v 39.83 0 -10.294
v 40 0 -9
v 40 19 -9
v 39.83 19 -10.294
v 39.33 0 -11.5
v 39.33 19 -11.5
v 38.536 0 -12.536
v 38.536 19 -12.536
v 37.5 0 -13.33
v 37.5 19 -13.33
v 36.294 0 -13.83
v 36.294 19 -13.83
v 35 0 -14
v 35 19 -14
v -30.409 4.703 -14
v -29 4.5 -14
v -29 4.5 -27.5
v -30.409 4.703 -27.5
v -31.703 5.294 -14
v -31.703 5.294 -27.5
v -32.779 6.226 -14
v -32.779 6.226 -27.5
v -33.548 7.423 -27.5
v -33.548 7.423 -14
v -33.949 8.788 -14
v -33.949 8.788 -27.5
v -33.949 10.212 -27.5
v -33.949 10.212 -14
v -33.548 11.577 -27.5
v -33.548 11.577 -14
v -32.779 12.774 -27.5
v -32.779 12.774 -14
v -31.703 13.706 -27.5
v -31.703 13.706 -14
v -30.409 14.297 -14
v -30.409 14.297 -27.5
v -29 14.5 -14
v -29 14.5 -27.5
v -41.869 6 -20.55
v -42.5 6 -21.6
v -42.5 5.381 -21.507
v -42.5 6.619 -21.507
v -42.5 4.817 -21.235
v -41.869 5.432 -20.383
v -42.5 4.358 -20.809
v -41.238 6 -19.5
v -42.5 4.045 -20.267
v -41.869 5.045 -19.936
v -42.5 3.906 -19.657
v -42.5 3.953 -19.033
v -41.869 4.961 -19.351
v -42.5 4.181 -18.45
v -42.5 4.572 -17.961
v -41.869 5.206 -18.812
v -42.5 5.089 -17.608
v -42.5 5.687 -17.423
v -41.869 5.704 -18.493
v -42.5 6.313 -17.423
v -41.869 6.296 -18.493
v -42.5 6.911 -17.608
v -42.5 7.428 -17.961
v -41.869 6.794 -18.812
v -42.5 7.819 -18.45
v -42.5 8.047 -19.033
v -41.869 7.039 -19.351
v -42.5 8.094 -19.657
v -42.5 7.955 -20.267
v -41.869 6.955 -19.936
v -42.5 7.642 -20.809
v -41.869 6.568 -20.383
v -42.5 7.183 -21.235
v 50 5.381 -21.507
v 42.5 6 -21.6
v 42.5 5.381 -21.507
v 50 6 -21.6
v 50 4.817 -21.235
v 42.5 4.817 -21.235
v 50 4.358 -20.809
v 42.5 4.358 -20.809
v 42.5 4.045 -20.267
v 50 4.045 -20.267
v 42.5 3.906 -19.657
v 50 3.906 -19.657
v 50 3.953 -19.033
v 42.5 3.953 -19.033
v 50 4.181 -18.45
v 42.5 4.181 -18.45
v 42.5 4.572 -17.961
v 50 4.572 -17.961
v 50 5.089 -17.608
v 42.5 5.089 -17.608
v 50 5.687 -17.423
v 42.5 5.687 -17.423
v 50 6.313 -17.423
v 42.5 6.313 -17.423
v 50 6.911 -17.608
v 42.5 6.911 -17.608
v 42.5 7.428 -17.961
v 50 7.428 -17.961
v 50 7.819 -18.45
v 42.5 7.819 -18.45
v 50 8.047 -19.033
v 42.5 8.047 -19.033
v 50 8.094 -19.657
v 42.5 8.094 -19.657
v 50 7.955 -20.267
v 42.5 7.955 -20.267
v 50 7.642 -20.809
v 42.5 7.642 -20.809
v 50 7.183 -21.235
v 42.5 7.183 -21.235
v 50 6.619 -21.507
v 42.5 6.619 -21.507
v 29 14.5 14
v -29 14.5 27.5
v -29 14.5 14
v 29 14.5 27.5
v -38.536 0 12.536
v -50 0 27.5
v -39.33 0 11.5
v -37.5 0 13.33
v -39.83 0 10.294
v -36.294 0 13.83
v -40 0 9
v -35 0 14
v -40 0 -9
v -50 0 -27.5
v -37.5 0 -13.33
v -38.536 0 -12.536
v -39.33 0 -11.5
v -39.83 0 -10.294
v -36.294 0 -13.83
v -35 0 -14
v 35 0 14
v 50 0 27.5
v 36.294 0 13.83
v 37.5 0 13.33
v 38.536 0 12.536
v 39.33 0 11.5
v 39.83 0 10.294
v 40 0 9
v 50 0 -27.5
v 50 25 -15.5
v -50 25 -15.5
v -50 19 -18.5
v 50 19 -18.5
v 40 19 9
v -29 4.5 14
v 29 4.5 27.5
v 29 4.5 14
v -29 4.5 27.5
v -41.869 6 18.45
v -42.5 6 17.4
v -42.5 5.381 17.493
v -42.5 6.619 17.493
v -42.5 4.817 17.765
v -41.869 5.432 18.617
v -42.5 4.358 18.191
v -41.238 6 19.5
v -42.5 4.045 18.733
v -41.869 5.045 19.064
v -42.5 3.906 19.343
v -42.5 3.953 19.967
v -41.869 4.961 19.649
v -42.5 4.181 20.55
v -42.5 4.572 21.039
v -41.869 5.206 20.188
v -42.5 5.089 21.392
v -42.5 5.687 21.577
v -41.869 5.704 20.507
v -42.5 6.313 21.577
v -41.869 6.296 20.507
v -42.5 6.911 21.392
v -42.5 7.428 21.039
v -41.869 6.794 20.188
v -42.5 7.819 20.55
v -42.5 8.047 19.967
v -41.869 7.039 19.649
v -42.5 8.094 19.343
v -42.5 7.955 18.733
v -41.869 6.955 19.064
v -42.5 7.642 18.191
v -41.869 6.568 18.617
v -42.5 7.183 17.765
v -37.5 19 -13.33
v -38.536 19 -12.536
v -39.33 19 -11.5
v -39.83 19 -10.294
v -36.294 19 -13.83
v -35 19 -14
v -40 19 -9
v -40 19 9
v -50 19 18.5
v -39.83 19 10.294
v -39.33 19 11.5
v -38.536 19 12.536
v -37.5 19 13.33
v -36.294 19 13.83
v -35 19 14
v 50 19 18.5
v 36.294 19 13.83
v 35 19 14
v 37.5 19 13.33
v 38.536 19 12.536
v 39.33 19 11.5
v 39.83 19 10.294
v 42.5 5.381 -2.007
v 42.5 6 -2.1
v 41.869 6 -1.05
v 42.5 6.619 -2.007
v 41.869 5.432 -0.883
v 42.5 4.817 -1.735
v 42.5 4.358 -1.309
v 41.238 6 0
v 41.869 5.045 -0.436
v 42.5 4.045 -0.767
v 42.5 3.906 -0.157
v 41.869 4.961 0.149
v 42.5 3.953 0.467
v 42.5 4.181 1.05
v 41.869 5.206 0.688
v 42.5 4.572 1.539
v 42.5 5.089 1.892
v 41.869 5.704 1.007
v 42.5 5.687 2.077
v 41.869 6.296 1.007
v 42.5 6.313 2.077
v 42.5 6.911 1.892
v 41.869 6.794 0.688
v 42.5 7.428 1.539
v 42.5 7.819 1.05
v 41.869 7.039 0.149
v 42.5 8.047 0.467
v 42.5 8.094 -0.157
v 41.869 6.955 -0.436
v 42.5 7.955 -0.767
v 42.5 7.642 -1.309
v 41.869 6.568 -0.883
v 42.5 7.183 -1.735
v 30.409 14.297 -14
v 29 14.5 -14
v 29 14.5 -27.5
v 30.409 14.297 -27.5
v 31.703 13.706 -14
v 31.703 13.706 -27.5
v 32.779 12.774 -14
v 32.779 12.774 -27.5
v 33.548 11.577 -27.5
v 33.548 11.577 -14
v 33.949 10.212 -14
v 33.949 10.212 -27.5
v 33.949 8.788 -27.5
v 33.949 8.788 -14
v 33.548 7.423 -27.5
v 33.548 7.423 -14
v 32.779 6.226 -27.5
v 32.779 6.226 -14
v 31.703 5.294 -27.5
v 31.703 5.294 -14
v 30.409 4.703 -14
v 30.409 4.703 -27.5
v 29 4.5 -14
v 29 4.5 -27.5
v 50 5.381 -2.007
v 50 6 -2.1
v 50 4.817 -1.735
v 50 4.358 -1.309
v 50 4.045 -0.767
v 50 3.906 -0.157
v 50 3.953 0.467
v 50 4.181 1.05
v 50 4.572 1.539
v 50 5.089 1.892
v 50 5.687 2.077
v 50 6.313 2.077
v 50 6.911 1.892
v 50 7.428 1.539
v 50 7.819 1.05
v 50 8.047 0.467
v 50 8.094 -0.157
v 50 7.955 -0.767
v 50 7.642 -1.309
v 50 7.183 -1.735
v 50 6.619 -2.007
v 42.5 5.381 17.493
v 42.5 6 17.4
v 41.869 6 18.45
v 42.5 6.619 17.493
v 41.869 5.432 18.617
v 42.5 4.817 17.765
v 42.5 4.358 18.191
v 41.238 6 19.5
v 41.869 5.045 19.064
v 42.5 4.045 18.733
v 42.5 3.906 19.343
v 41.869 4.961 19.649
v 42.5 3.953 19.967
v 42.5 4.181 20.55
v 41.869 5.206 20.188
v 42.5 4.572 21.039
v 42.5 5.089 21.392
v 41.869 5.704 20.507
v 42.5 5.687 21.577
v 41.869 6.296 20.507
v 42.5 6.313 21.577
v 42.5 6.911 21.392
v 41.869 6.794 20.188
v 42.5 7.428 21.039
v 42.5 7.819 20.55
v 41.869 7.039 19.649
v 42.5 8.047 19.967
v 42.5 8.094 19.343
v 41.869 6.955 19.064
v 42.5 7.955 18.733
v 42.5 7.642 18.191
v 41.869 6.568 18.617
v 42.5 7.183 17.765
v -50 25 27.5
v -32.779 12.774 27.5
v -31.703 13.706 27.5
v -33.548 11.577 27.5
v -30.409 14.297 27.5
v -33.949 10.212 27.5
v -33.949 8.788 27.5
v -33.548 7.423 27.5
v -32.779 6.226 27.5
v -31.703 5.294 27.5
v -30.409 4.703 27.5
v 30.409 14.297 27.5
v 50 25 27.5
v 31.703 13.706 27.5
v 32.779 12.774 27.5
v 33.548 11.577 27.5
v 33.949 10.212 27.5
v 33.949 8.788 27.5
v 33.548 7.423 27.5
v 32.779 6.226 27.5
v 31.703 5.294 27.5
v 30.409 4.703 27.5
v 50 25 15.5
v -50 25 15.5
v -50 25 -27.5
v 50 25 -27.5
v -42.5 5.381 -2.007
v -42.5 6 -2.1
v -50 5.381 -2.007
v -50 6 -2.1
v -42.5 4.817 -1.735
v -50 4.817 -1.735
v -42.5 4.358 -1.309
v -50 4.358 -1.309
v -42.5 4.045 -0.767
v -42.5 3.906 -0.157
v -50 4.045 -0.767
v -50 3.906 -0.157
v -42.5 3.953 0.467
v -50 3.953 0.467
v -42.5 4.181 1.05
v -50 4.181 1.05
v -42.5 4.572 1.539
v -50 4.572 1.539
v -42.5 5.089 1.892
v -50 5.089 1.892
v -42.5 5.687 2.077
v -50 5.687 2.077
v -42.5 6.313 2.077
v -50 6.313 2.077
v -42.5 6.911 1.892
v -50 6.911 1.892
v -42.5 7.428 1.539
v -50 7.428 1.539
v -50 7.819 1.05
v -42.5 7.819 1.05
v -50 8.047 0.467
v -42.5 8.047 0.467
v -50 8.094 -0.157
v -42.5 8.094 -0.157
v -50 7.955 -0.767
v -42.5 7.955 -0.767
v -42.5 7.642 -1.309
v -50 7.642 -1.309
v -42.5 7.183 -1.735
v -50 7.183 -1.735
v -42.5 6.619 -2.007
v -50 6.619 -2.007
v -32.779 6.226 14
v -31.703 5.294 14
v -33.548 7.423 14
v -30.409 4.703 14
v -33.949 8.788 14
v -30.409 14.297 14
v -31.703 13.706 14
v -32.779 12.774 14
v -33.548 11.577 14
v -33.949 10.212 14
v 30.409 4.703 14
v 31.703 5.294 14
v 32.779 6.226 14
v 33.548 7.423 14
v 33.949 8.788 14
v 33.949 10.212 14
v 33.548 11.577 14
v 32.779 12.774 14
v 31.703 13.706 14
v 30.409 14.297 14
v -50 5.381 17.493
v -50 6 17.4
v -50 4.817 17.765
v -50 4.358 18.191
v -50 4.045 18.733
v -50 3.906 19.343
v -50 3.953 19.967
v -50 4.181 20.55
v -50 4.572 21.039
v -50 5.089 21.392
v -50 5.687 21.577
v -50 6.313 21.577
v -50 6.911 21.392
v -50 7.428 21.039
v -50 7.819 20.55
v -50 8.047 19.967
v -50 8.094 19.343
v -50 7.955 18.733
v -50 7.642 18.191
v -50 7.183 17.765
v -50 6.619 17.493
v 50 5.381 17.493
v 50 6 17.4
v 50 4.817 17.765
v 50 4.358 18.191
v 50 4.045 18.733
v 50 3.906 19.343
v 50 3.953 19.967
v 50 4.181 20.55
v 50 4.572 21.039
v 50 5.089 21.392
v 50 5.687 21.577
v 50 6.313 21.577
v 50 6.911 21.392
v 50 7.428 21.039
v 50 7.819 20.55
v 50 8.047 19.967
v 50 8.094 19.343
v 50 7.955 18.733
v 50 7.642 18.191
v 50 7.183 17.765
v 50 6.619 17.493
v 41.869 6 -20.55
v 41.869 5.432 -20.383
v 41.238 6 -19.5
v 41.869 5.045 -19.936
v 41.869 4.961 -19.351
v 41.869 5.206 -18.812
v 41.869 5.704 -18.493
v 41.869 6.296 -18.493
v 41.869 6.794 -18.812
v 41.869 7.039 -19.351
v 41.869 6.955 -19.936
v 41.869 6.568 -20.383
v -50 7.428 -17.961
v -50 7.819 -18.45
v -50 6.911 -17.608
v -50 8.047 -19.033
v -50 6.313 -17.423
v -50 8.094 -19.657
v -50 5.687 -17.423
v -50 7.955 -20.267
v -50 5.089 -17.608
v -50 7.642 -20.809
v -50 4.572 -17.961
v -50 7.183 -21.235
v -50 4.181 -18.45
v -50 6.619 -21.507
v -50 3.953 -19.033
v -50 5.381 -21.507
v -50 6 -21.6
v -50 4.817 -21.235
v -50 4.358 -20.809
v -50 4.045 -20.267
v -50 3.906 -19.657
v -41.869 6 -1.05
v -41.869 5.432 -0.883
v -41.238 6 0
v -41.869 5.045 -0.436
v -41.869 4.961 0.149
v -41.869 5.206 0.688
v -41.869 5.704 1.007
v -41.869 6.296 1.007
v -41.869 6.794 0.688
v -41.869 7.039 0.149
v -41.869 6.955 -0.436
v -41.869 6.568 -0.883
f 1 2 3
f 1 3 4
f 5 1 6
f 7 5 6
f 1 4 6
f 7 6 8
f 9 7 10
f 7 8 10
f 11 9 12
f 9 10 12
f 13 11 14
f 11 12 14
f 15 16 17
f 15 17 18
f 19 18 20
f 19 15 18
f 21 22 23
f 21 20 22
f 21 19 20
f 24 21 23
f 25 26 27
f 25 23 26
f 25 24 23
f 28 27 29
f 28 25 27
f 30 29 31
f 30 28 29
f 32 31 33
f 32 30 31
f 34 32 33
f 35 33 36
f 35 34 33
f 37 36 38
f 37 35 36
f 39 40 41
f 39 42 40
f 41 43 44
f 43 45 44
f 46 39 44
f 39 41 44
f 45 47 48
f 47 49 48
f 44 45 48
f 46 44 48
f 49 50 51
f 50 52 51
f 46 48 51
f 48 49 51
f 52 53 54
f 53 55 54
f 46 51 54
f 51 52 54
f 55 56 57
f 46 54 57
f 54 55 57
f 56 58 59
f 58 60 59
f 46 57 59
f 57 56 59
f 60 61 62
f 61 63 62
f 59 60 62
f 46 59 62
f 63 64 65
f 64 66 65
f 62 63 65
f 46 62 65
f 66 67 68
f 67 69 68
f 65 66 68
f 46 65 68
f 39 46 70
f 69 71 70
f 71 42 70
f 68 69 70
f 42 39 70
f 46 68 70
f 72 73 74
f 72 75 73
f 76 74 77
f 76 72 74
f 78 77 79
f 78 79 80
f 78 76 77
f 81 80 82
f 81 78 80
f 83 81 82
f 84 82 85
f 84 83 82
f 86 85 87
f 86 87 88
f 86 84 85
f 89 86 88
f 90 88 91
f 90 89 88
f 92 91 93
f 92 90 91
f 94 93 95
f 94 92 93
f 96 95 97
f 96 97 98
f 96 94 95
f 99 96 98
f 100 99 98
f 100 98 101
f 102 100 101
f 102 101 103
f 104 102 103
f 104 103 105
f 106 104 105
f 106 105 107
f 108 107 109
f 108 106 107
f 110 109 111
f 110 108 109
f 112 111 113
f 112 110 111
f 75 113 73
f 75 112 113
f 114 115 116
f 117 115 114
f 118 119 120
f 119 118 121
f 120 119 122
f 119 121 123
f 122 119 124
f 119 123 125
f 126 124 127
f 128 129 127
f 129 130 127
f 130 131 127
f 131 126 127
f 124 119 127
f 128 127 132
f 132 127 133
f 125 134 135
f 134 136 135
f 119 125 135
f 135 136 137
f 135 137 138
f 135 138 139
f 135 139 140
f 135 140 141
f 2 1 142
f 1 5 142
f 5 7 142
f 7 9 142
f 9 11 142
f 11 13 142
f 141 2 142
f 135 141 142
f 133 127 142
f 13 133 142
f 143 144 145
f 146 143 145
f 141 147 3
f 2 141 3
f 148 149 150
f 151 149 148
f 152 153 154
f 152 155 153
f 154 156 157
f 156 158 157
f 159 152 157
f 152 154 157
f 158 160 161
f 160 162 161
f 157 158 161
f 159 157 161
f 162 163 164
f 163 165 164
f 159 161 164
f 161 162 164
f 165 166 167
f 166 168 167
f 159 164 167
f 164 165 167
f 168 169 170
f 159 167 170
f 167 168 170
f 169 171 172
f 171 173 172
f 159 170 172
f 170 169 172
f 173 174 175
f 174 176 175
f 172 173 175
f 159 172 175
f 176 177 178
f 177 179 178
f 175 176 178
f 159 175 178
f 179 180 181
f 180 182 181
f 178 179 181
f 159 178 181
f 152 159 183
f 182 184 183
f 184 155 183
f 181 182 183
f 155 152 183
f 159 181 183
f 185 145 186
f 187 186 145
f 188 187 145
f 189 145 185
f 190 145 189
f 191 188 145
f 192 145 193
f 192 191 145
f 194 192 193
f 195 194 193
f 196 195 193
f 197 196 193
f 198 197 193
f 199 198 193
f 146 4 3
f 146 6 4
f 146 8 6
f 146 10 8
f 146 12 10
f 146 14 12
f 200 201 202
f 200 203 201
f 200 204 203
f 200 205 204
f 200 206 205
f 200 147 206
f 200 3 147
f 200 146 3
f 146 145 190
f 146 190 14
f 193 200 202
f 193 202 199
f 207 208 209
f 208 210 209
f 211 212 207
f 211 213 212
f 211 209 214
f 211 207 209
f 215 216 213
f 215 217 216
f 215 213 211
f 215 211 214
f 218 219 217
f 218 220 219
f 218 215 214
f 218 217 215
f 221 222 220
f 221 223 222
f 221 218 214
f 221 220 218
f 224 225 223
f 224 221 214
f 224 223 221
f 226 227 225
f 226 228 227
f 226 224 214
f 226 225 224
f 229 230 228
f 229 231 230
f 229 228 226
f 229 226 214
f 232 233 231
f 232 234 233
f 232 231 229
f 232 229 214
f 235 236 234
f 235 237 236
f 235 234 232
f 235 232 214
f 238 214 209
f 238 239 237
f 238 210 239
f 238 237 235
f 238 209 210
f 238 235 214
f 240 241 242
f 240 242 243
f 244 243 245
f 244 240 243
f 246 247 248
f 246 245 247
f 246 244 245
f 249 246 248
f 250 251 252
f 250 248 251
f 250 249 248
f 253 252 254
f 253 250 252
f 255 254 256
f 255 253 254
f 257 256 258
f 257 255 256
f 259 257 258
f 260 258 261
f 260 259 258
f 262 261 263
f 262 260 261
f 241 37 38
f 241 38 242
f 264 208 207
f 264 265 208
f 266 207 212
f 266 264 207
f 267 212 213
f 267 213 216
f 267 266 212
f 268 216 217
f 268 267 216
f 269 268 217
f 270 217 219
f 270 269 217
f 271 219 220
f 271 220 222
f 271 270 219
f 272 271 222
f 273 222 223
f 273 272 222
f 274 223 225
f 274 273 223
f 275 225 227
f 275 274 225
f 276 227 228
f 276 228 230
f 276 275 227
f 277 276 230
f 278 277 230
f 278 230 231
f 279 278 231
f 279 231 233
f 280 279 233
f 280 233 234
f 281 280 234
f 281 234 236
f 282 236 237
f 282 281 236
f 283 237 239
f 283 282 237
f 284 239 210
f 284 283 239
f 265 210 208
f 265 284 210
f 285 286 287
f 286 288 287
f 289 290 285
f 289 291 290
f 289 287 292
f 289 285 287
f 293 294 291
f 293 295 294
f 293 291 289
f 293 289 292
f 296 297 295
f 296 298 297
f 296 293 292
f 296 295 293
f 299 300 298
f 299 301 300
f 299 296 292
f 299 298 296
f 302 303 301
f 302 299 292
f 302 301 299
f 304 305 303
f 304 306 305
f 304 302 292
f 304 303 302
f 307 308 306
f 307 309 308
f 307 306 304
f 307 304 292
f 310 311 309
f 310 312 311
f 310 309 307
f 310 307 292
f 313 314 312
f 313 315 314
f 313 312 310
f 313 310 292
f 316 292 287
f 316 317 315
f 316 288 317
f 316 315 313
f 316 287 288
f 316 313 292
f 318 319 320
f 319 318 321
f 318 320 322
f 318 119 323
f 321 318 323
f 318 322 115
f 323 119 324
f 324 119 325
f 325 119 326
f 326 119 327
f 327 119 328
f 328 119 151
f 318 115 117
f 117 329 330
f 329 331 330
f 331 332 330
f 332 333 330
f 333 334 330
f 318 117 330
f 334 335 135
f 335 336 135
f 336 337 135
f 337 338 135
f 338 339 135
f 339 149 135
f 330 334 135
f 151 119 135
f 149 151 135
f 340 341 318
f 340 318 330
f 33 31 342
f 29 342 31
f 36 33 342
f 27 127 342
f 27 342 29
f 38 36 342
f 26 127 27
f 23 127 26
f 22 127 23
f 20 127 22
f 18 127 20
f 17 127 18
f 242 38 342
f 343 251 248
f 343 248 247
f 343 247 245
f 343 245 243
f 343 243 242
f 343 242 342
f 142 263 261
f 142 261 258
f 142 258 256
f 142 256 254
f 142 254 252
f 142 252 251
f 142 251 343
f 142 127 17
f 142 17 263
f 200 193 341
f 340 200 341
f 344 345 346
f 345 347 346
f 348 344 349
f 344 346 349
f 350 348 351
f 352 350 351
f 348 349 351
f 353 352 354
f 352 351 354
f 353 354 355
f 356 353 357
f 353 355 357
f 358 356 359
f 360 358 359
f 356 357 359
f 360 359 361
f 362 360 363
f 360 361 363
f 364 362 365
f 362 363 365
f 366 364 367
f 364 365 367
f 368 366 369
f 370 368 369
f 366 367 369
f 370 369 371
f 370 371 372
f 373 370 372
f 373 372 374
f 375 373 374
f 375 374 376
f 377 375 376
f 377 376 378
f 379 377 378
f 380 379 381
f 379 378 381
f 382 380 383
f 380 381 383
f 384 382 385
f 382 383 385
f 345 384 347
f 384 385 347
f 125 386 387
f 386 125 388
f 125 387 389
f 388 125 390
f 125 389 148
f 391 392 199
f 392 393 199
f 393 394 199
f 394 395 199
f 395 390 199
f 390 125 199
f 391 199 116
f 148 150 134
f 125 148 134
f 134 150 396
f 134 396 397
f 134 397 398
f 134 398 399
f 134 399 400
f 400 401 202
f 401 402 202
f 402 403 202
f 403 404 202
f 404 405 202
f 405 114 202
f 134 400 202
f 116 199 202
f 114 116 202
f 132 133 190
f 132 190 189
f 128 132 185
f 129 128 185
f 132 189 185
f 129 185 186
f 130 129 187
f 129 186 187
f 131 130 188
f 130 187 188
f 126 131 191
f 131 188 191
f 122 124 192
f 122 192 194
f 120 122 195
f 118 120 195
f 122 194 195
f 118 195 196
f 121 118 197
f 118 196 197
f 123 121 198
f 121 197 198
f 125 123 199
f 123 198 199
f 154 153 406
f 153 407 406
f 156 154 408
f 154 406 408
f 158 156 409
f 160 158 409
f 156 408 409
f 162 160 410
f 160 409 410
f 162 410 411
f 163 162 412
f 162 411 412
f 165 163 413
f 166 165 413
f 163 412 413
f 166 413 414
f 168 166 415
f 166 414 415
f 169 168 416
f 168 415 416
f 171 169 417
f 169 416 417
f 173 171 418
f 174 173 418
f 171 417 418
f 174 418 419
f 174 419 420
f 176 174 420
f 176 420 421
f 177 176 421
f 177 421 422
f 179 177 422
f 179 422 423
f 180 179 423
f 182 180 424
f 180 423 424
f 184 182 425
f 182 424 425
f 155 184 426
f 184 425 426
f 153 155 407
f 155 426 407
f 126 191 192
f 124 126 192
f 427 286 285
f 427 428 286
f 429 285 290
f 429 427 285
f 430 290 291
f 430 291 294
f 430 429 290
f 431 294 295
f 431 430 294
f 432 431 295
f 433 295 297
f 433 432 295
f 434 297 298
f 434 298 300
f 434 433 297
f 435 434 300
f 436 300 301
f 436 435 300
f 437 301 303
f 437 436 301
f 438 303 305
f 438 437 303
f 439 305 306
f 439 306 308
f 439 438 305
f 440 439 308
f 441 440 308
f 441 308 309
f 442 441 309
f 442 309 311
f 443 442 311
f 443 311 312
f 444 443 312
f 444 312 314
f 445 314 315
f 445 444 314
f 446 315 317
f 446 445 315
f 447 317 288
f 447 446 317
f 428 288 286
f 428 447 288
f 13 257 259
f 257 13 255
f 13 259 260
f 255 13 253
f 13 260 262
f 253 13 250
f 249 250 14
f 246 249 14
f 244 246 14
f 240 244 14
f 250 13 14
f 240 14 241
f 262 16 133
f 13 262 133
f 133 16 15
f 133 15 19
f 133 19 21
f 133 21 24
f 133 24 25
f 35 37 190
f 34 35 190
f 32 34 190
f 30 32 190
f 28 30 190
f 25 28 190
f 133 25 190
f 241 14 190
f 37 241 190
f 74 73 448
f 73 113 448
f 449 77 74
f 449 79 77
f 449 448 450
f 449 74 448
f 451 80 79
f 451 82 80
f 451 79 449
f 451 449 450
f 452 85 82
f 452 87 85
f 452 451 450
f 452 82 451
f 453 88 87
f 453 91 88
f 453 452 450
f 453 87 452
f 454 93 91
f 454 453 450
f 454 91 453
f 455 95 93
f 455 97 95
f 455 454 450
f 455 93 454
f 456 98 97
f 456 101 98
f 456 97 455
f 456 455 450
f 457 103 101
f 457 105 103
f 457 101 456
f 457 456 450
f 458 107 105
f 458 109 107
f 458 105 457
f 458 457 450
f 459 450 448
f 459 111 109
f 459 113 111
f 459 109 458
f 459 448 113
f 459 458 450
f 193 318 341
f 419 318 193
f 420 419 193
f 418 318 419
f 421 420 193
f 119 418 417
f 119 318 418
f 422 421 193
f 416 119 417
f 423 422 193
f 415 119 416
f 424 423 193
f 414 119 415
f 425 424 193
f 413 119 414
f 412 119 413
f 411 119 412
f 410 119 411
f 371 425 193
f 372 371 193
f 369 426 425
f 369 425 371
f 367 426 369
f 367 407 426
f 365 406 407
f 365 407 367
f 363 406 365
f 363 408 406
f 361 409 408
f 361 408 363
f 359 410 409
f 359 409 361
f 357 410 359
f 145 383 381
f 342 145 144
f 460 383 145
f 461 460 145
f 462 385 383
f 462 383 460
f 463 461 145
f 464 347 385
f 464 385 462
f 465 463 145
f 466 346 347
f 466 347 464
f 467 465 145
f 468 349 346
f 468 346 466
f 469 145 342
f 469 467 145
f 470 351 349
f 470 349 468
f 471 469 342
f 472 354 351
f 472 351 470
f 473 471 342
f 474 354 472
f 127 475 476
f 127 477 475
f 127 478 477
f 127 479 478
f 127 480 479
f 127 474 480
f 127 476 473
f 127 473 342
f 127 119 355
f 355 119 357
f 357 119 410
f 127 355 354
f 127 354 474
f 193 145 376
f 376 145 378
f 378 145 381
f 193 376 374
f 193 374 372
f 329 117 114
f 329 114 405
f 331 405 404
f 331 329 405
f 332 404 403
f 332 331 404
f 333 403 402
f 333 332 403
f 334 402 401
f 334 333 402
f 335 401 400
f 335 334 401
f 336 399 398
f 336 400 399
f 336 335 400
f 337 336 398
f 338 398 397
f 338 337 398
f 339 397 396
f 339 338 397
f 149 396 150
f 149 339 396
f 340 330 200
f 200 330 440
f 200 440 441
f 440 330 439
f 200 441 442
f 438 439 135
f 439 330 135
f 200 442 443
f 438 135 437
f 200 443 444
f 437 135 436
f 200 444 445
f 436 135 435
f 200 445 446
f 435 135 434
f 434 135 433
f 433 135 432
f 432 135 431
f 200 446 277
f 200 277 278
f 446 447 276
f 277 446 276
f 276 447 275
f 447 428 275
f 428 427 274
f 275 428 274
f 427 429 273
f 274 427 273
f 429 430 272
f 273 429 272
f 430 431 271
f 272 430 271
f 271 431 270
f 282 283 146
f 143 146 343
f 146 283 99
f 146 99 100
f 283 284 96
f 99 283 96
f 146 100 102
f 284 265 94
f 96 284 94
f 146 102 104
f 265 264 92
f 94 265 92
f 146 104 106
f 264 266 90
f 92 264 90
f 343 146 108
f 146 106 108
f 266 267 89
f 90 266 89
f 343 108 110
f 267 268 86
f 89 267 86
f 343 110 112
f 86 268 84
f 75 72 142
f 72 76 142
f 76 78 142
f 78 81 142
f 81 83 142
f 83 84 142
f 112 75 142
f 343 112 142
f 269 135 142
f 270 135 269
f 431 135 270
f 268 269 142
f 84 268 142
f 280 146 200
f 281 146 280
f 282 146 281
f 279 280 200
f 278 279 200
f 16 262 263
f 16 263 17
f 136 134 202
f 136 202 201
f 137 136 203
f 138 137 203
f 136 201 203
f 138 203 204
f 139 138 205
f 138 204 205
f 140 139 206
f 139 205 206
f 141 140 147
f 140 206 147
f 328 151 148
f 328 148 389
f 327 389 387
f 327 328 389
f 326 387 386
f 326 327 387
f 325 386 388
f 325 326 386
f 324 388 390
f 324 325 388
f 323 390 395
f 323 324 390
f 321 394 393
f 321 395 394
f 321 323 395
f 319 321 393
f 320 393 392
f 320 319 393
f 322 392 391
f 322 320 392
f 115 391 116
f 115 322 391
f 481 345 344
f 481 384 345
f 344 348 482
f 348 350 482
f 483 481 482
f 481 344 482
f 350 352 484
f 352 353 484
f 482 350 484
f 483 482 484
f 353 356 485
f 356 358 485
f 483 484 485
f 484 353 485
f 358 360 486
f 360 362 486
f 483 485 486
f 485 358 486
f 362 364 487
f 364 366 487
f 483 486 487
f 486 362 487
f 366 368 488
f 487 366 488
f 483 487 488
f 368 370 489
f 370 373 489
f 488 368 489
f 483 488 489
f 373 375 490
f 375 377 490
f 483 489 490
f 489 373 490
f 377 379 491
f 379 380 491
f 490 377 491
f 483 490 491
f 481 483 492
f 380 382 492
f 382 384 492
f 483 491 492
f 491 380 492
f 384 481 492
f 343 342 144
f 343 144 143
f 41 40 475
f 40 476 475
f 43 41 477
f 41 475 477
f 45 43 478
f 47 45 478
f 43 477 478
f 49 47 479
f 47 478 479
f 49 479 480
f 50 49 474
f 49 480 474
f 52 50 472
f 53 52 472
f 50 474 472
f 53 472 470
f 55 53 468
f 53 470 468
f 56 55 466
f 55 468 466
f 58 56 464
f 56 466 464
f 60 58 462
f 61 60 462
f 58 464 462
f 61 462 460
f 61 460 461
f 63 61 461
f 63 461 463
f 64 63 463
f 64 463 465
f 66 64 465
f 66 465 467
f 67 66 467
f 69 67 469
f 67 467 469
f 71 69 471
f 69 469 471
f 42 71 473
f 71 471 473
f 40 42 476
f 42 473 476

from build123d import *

# Parameters (mm, degrees)
SKETCH1_W                      = 100
SKETCH1_H                      = 55
BOSS_EXTRUDE1_DEPTH            = 25
CUT_EXTRUDE1_DEPTH             = 26
CUT_EXTRUDE2_DEPTH             = 101
CUT_EXTRUDE3_DEPTH             = 56
M5X0_8_TAPPED_HOLE1_AT_2_COUNT = 2
M5X0_8_TAPPED_HOLE1_AT_2_PITCH = 19.5
M5X0_8_TAPPED_HOLE1_AT_3_COUNT = 2
M5X0_8_TAPPED_HOLE1_AT_3_PITCH = 39


with BuildPart() as part:
    # Sketch1 → Boss-Extrude1 (new body)
    with BuildSketch(Plane(origin=(0, 0, 0), x_dir=(1, 0, 0), z_dir=(0, 1, 0))):
        Rectangle(SKETCH1_W, SKETCH1_H)
    extrude(amount=BOSS_EXTRUDE1_DEPTH)

    # Sketch2 → Cut-Extrude1 (cut, through all)
    with BuildSketch(Plane(origin=(0, 25, 0), x_dir=(1, 0, 0), z_dir=(0, 1, 0))):
        with BuildLine():
            Line((-35, -14), (35, -14))
            ThreePointArc((35, -14), (38.535533906, -12.535533906), (40, -9))
            Line((40, -9), (40, 9))
            ThreePointArc((40, 9), (38.535533906, 12.535533906), (35, 14))
            Line((35, 14), (-35, 14))
            ThreePointArc((-35, 14), (-38.535533906, 12.535533906), (-40, 9))
            Line((-40, 9), (-40, -9))
            ThreePointArc((-40, -9), (-38.535533906, -12.535533906), (-35, -14))
        make_face()
    extrude(amount=-CUT_EXTRUDE1_DEPTH, mode=Mode.SUBTRACT)

    # Sketch3 → Cut-Extrude2 (cut, through all)
    with BuildSketch(Plane(origin=(50, 0, 0), x_dir=(0, 0, -1), z_dir=(1, 0, 0))):
        Polygon((15.5, 25), (18.5, 19), (-18.5, 19), (-15.5, 25), align=None)
    extrude(amount=-CUT_EXTRUDE2_DEPTH, mode=Mode.SUBTRACT)

    # Sketch4 → Cut-Extrude3 (cut, through all)
    with BuildSketch(Plane.XY.offset(27.5)):
        with BuildLine():
            Line((-29, 14.5), (29, 14.5))
            ThreePointArc((29, 14.5), (34, 9.5), (29, 4.5))
            Line((29, 4.5), (-29, 4.5))
            ThreePointArc((-29, 4.5), (-34, 9.5), (-29, 14.5))
        make_face()
    extrude(amount=-CUT_EXTRUDE3_DEPTH, mode=Mode.SUBTRACT)

    # Sketch7 → M5x0.8 Tapped Hole1 (revolve, cut)
    with BuildSketch(Plane(origin=(50, 6, 19.5), x_dir=(0, 0, -1), z_dir=(0, 1, 0))):
        Polygon((0, 0), (0, 8.7618073), (2.1, 7.5), (2.1, 0), align=None)
    m5x0_8_tapped_hole1 = revolve(axis=Axis((56.35, 6, 19.5), (-1, 0, 0)), mode=Mode.SUBTRACT)

    # M5x0.8 Tapped Hole1 at 2: M5x0.8 Tapped Hole1 ×2
    with Locations(*[(0, 0, -i * M5X0_8_TAPPED_HOLE1_AT_2_PITCH) for i in range(1, M5X0_8_TAPPED_HOLE1_AT_2_COUNT)]):
        add(m5x0_8_tapped_hole1, mode=Mode.SUBTRACT)

    # M5x0.8 Tapped Hole1 at 3: M5x0.8 Tapped Hole1 ×2
    with Locations(*[(0, 0, -i * M5X0_8_TAPPED_HOLE1_AT_3_PITCH) for i in range(1, M5X0_8_TAPPED_HOLE1_AT_3_COUNT)]):
        add(m5x0_8_tapped_hole1, mode=Mode.SUBTRACT)

    # Mirror1: M5x0.8 Tapped Hole1 across plane
    add(m5x0_8_tapped_hole1.mirror(Plane(origin=(0, 0, 0), x_dir=(0, 0, 1), z_dir=(1, 0, 0))), mode=Mode.SUBTRACT)

    # Mirror1 copy 1 sketch → Mirror1 copy 1 (revolve, cut)
    with BuildSketch(Plane(origin=(-50, 6, 0), x_dir=(0, 0, -1), z_dir=(0, 1, 0))):
        Polygon((0, 0), (0, -8.7618073), (2.1, -7.5), (2.1, 0), align=None)
    revolve(axis=Axis((-56.35, 6, 0), (-1, 0, 0)), mode=Mode.SUBTRACT)

    # Mirror1 copy 2 sketch → Mirror1 copy 2 (revolve, cut)
    with BuildSketch(Plane(origin=(-50, 6, -19.5), x_dir=(0, 0, -1), z_dir=(0, 1, 0))):
        Polygon((0, 0), (0, -8.7618073), (2.1, -7.5), (2.1, 0), align=None)
    revolve(axis=Axis((-56.35, 6, -19.5), (-1, 0, 0)), mode=Mode.SUBTRACT)


solid = part.part
